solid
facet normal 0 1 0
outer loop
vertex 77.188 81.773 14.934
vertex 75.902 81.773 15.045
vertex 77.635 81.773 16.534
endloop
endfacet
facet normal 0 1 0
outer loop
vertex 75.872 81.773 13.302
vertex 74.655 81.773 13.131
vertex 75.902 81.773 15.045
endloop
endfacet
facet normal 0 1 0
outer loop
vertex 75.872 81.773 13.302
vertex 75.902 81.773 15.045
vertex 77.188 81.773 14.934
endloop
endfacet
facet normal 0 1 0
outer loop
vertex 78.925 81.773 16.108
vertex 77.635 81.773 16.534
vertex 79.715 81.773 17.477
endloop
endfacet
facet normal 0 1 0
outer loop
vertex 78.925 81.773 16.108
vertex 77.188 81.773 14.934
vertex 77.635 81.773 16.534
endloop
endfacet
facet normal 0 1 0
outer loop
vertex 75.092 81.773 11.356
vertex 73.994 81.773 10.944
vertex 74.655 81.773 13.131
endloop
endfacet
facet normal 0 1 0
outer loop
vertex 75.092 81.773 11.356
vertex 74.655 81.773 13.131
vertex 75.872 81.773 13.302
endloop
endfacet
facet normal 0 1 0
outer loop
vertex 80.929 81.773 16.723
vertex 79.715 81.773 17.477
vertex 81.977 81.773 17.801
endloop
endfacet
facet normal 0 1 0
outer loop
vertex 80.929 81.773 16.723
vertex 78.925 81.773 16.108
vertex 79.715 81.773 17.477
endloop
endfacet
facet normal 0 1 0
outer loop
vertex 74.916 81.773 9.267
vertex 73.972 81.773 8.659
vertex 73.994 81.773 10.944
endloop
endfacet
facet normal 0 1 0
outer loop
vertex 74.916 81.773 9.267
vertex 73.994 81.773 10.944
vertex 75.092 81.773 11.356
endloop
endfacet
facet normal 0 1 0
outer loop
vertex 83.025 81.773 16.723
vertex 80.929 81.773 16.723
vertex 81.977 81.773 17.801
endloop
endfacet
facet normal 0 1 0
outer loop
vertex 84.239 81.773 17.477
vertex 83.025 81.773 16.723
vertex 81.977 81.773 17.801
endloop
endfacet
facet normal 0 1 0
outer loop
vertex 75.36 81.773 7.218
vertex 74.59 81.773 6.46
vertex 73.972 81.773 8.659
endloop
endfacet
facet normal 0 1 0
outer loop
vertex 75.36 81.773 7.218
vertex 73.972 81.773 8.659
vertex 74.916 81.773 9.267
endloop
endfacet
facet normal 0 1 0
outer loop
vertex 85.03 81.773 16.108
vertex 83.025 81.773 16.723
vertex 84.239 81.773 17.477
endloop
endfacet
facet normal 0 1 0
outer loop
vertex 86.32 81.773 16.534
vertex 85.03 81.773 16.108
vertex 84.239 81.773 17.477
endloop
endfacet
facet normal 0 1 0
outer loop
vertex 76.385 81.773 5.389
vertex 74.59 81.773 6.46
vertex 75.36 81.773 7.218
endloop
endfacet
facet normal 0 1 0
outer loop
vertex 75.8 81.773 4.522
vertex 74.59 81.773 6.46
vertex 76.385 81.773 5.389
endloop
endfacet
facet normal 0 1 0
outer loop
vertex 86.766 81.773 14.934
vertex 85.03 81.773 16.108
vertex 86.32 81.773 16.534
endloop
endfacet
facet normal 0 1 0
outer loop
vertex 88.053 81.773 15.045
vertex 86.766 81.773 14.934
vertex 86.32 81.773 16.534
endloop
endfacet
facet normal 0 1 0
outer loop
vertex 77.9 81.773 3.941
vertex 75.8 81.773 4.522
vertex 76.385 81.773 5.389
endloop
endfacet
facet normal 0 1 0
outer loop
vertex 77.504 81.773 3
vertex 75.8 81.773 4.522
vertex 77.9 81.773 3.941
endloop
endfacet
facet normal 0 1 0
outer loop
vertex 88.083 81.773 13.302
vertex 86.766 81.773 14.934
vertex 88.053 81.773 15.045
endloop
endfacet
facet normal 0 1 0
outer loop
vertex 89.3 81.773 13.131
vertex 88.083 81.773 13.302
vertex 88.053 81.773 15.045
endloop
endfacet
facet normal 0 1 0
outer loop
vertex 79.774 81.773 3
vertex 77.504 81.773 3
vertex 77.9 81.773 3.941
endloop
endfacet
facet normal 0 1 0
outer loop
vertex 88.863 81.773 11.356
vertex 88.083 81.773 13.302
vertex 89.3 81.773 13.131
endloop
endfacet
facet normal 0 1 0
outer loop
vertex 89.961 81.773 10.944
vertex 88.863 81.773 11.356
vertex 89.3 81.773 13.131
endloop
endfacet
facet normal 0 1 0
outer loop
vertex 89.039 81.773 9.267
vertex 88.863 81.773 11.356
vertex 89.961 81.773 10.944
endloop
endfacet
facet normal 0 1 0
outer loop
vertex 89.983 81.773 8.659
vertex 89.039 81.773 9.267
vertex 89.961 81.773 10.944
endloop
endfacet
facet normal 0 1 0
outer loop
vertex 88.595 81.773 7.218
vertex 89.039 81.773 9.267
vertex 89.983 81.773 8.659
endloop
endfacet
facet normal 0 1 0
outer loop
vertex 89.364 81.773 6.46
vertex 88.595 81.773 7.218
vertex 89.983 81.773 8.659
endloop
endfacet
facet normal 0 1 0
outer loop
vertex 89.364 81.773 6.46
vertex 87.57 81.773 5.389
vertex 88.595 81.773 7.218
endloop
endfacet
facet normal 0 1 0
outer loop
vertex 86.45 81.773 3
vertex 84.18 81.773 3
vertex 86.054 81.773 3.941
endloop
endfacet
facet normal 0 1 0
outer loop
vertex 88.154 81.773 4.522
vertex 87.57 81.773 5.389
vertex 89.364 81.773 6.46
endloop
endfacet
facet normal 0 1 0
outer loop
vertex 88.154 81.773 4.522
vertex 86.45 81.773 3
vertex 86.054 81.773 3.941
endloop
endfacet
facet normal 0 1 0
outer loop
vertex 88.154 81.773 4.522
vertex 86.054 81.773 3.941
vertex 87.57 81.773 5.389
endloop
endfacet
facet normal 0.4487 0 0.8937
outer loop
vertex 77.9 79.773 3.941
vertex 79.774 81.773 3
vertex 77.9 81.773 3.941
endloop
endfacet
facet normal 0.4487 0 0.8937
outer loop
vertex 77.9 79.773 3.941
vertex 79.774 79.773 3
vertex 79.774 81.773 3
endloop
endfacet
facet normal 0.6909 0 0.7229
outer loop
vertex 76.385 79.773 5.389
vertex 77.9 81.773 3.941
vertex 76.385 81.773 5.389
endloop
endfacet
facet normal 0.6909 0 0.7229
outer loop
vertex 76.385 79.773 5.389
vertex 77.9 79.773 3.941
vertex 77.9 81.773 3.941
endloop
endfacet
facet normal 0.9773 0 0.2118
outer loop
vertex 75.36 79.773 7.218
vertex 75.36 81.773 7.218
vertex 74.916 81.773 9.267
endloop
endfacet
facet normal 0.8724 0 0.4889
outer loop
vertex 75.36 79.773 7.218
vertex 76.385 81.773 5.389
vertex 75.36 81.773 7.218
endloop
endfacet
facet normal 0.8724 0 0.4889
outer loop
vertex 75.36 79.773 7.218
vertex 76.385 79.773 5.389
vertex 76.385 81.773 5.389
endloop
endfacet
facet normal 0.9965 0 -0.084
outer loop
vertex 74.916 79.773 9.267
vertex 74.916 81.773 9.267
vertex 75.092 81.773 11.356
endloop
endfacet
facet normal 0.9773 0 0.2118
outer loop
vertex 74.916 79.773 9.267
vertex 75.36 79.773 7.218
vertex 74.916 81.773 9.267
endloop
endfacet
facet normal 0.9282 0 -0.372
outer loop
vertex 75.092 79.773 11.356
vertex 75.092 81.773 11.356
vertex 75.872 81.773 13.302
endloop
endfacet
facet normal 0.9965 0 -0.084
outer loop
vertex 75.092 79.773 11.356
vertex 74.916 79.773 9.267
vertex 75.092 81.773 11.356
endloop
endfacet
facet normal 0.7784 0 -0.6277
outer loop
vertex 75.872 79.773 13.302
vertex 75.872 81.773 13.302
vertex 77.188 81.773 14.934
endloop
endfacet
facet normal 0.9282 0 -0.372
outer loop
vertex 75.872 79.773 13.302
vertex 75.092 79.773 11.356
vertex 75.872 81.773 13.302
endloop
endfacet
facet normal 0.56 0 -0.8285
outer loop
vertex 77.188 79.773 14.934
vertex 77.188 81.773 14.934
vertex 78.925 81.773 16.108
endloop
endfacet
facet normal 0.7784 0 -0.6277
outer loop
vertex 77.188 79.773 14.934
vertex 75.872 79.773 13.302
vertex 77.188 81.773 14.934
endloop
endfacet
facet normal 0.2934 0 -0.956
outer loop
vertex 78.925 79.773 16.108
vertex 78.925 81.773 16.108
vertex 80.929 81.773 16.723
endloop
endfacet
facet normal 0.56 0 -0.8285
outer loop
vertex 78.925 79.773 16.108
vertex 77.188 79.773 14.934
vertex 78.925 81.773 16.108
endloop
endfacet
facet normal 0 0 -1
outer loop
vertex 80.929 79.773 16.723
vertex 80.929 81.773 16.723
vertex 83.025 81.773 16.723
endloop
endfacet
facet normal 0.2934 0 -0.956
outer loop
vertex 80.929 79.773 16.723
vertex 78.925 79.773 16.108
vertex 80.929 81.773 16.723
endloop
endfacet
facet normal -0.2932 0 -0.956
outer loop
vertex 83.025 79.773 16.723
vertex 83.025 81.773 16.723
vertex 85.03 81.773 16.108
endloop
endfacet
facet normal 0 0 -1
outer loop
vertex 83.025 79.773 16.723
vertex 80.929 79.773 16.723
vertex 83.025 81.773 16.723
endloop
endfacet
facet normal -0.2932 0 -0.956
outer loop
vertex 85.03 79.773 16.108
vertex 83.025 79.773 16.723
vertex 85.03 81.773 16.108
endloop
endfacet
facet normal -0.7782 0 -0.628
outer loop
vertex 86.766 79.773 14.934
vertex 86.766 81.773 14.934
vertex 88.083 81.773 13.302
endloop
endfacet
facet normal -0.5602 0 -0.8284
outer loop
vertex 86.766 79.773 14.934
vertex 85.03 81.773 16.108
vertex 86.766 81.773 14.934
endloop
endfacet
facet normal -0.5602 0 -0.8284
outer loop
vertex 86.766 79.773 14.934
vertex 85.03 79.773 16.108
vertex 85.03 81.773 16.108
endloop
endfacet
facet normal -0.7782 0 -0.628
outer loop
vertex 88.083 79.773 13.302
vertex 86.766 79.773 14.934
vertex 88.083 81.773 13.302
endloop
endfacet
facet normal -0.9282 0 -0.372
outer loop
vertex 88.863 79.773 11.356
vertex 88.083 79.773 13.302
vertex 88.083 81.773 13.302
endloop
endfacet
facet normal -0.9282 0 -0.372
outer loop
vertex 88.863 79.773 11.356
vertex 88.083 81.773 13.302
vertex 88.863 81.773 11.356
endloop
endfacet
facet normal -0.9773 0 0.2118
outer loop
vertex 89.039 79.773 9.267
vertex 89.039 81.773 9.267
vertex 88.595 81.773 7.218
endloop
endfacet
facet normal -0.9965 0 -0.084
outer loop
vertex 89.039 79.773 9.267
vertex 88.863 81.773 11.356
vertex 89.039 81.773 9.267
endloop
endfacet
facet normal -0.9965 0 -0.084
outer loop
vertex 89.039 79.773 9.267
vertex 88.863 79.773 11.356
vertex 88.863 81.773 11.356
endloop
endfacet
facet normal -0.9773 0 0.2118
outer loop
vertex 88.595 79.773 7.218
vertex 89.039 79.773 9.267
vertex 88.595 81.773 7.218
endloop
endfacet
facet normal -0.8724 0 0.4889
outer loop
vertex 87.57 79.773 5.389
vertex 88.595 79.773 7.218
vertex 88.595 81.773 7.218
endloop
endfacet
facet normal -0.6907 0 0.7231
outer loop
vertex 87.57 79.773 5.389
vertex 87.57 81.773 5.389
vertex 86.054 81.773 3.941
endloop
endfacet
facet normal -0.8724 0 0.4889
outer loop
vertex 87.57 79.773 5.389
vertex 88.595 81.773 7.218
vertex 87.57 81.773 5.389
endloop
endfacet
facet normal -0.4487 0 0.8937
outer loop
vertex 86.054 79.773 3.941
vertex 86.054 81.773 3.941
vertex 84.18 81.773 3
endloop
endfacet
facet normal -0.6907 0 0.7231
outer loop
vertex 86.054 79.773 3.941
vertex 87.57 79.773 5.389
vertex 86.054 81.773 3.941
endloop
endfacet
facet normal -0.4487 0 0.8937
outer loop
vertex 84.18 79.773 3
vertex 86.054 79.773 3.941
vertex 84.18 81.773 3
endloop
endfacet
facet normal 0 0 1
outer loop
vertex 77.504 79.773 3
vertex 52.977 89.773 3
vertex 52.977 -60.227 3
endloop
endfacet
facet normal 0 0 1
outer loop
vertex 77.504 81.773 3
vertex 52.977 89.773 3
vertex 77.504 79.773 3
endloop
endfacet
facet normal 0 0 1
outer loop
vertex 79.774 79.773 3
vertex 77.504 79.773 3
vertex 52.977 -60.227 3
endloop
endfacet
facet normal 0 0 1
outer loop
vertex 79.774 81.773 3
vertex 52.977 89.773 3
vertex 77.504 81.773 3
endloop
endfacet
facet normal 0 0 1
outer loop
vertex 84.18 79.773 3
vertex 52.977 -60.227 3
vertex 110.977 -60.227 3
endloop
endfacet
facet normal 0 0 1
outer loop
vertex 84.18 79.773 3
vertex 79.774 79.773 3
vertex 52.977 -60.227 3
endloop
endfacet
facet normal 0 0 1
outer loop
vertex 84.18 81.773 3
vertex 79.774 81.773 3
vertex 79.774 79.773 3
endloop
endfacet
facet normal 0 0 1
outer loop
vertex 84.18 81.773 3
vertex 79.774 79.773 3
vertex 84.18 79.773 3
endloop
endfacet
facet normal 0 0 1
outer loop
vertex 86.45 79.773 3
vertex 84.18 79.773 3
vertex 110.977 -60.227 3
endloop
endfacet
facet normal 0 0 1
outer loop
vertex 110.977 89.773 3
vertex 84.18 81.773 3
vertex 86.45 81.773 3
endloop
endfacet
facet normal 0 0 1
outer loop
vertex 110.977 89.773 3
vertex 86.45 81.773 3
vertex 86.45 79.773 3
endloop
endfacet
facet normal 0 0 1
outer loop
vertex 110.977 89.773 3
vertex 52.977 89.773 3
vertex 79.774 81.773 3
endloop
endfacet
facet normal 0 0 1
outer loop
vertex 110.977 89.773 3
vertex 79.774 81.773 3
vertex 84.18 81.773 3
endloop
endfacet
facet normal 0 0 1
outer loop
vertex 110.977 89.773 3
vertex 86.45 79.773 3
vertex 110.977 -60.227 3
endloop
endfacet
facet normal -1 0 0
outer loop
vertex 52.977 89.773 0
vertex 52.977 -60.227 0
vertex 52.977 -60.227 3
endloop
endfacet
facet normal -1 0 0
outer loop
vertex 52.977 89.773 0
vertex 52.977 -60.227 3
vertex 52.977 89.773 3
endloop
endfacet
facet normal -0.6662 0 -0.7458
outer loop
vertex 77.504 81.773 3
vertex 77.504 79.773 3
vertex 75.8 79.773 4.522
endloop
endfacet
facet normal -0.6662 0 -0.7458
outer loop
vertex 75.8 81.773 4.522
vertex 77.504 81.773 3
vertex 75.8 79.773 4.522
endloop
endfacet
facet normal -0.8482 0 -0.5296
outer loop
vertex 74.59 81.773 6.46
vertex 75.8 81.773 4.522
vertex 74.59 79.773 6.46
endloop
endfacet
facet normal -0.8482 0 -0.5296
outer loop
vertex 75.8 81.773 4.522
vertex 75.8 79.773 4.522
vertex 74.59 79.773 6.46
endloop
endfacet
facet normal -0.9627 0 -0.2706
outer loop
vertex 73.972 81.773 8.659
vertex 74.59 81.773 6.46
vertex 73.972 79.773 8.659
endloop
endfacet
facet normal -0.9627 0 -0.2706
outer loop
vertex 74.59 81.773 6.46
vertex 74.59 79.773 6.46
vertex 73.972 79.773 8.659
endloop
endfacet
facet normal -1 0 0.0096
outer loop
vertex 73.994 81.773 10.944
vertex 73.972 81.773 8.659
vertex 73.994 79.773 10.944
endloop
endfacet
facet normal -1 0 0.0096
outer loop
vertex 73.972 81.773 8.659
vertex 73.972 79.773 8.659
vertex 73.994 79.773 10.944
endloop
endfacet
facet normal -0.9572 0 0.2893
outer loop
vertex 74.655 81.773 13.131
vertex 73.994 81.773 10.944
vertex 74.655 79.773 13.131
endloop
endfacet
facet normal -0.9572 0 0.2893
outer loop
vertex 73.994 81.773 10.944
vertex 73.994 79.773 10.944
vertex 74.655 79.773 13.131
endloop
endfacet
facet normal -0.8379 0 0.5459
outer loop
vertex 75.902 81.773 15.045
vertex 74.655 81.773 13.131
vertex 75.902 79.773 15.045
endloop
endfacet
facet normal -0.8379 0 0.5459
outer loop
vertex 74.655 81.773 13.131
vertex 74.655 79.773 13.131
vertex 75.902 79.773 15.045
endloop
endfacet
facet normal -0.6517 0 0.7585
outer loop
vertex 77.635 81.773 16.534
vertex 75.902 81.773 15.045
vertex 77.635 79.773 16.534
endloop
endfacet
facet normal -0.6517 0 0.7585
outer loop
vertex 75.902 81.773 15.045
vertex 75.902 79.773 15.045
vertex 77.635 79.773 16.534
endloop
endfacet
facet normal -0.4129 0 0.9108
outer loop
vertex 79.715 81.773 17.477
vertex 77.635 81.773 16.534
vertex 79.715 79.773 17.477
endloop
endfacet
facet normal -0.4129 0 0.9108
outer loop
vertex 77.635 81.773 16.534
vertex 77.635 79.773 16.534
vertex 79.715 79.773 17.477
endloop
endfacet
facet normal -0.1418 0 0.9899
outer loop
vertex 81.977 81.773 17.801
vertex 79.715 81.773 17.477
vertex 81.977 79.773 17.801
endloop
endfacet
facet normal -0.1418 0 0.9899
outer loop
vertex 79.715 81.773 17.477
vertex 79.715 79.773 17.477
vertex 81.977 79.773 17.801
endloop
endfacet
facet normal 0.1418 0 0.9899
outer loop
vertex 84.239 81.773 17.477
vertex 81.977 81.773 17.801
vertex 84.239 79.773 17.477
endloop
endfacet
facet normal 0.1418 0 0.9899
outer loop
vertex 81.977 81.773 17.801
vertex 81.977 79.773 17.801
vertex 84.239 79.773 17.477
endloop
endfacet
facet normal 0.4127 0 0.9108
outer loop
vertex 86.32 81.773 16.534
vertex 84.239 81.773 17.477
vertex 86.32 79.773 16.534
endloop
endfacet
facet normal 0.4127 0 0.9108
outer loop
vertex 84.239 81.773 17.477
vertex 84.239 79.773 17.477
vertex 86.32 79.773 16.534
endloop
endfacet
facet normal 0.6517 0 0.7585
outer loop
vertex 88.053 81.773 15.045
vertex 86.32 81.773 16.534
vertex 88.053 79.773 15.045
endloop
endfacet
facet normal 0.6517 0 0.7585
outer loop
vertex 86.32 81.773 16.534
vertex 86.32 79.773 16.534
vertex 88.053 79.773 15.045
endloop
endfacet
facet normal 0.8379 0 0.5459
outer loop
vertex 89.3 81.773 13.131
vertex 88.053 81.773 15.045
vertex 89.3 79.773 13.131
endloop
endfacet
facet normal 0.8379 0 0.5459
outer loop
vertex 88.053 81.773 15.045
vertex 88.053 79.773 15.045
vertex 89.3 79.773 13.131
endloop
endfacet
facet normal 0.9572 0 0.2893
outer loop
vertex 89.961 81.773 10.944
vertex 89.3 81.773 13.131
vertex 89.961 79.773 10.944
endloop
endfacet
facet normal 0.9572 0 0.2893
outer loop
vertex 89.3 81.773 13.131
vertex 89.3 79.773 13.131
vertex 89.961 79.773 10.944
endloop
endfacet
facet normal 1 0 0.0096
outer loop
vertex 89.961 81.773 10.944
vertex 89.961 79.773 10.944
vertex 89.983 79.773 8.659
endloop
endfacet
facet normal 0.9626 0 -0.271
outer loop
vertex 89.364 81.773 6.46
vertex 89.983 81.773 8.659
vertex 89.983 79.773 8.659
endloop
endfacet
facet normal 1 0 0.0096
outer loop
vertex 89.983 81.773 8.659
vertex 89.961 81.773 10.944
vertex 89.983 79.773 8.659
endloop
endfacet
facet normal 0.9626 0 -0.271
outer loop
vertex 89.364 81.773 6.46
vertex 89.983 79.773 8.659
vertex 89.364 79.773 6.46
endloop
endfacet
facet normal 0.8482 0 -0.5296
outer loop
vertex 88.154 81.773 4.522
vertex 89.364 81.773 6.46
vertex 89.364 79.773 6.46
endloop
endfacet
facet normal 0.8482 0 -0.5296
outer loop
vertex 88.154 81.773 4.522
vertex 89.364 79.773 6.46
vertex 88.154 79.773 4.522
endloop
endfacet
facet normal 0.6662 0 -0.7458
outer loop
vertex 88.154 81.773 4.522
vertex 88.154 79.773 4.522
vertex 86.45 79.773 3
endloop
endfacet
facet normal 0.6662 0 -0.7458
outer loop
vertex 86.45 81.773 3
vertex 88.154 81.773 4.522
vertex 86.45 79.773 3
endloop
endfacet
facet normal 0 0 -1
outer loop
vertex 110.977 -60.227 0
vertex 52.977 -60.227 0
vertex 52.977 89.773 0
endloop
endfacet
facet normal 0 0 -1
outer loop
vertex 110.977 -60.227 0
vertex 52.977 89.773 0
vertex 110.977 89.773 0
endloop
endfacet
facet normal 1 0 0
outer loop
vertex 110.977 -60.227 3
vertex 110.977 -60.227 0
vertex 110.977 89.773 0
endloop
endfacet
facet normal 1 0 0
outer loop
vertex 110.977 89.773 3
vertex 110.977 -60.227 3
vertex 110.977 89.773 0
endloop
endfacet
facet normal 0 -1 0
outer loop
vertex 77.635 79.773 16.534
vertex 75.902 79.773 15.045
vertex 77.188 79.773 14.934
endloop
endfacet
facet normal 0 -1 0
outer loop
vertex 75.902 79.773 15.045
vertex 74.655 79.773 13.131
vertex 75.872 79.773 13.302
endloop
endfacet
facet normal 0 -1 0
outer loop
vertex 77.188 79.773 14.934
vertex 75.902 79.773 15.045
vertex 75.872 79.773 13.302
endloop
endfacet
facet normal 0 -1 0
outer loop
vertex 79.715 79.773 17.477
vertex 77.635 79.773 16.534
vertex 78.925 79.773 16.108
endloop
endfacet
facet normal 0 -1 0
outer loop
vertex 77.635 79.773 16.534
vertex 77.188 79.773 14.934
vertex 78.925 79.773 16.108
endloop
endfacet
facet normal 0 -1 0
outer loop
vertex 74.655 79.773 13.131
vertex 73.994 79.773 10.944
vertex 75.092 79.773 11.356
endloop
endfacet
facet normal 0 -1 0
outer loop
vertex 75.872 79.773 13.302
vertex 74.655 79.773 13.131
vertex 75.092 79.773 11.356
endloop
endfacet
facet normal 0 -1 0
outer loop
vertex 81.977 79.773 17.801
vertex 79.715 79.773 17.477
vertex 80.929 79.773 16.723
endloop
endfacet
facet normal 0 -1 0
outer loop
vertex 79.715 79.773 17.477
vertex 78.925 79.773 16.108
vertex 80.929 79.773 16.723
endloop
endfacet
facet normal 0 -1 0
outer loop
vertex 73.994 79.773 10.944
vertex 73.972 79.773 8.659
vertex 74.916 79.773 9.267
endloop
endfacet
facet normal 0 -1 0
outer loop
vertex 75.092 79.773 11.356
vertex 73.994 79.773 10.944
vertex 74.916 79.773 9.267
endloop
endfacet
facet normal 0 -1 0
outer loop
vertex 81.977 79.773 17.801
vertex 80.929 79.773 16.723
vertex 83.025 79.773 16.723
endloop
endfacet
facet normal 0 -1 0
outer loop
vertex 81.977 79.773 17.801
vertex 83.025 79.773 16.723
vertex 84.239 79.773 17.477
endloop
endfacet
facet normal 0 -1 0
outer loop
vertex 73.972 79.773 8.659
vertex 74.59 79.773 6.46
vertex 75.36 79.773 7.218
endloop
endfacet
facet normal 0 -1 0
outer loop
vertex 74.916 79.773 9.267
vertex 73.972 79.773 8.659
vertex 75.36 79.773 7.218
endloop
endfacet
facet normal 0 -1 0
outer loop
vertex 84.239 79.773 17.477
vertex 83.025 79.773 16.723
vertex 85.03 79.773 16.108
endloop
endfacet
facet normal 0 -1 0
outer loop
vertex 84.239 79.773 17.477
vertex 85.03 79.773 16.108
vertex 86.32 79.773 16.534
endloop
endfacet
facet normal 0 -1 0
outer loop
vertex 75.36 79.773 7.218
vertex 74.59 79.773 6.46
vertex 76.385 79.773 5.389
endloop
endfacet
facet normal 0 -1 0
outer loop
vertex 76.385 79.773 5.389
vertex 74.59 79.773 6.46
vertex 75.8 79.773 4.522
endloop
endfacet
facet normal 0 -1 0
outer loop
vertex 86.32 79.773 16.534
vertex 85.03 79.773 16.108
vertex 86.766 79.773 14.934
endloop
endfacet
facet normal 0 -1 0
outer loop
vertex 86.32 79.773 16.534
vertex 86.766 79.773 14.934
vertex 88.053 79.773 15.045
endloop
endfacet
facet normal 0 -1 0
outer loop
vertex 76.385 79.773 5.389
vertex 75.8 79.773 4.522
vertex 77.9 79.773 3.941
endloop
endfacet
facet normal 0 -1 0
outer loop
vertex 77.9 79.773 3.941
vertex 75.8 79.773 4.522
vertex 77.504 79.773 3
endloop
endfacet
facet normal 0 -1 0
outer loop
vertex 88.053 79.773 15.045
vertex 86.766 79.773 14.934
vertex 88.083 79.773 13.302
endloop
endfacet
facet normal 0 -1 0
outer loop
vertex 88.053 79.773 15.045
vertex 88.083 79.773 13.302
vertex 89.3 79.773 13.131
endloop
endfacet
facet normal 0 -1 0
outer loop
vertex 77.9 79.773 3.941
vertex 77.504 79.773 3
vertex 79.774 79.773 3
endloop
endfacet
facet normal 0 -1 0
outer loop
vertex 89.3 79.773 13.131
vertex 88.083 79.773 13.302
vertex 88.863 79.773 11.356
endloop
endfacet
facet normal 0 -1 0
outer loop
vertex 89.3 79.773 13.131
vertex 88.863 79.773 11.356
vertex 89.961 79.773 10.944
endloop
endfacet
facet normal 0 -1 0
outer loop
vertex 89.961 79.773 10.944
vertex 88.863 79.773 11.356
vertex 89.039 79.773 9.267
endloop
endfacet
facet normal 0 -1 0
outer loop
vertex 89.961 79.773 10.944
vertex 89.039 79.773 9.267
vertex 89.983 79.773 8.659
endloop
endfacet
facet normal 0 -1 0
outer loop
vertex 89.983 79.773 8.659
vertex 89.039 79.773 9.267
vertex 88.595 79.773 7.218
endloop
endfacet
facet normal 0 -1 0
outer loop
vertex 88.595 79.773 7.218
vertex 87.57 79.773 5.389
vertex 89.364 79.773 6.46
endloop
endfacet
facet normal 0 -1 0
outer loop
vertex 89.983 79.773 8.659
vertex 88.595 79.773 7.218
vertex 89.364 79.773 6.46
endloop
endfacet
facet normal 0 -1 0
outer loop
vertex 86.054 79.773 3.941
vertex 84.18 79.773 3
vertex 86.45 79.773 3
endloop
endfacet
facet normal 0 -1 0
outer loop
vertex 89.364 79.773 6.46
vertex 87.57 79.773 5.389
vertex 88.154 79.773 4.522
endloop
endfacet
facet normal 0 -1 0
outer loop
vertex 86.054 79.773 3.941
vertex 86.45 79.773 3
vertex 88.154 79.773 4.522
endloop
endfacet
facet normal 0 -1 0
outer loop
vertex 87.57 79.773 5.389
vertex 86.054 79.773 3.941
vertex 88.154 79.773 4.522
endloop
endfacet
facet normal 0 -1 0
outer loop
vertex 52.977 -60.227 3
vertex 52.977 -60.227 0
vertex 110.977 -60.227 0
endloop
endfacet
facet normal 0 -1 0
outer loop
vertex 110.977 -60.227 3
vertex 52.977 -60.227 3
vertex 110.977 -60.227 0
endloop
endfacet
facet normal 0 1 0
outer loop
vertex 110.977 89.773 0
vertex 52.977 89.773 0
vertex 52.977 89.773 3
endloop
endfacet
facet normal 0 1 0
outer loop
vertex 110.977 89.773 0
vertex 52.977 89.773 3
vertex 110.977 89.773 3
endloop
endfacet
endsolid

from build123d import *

# Parameters (mm, degrees)
SKETCH1_W           = 58
SKETCH1_H           = 150
BOSS_EXTRUDE1_DEPTH = 3
SKETCH2_R           = 8.076191979
SKETCH2_R_2         = 7.076191979
EXTRUDE_THIN1_DEPTH = 2


with BuildPart() as part:
    # Sketch1 → Boss-Extrude1 (new body)
    with BuildSketch(Plane.XY):
        with Locations((81.977207271, 14.773129951)):
            Rectangle(SKETCH1_W, SKETCH1_H)
    extrude(amount=BOSS_EXTRUDE1_DEPTH)

    # Sketch2 → Extrude-Thin1 (add)
    with BuildSketch(Plane(origin=(0, 79.773129951, 0), x_dir=(1, 0, 0), z_dir=(0, 1, 0))):
        with Locations((81.977207271, -9.724450767)):
            Circle(SKETCH2_R)
        with Locations((81.977207271, -9.724450767)):
            Circle(SKETCH2_R_2, mode=Mode.SUBTRACT)
    extrude(amount=EXTRUDE_THIN1_DEPTH)


solid = part.part
